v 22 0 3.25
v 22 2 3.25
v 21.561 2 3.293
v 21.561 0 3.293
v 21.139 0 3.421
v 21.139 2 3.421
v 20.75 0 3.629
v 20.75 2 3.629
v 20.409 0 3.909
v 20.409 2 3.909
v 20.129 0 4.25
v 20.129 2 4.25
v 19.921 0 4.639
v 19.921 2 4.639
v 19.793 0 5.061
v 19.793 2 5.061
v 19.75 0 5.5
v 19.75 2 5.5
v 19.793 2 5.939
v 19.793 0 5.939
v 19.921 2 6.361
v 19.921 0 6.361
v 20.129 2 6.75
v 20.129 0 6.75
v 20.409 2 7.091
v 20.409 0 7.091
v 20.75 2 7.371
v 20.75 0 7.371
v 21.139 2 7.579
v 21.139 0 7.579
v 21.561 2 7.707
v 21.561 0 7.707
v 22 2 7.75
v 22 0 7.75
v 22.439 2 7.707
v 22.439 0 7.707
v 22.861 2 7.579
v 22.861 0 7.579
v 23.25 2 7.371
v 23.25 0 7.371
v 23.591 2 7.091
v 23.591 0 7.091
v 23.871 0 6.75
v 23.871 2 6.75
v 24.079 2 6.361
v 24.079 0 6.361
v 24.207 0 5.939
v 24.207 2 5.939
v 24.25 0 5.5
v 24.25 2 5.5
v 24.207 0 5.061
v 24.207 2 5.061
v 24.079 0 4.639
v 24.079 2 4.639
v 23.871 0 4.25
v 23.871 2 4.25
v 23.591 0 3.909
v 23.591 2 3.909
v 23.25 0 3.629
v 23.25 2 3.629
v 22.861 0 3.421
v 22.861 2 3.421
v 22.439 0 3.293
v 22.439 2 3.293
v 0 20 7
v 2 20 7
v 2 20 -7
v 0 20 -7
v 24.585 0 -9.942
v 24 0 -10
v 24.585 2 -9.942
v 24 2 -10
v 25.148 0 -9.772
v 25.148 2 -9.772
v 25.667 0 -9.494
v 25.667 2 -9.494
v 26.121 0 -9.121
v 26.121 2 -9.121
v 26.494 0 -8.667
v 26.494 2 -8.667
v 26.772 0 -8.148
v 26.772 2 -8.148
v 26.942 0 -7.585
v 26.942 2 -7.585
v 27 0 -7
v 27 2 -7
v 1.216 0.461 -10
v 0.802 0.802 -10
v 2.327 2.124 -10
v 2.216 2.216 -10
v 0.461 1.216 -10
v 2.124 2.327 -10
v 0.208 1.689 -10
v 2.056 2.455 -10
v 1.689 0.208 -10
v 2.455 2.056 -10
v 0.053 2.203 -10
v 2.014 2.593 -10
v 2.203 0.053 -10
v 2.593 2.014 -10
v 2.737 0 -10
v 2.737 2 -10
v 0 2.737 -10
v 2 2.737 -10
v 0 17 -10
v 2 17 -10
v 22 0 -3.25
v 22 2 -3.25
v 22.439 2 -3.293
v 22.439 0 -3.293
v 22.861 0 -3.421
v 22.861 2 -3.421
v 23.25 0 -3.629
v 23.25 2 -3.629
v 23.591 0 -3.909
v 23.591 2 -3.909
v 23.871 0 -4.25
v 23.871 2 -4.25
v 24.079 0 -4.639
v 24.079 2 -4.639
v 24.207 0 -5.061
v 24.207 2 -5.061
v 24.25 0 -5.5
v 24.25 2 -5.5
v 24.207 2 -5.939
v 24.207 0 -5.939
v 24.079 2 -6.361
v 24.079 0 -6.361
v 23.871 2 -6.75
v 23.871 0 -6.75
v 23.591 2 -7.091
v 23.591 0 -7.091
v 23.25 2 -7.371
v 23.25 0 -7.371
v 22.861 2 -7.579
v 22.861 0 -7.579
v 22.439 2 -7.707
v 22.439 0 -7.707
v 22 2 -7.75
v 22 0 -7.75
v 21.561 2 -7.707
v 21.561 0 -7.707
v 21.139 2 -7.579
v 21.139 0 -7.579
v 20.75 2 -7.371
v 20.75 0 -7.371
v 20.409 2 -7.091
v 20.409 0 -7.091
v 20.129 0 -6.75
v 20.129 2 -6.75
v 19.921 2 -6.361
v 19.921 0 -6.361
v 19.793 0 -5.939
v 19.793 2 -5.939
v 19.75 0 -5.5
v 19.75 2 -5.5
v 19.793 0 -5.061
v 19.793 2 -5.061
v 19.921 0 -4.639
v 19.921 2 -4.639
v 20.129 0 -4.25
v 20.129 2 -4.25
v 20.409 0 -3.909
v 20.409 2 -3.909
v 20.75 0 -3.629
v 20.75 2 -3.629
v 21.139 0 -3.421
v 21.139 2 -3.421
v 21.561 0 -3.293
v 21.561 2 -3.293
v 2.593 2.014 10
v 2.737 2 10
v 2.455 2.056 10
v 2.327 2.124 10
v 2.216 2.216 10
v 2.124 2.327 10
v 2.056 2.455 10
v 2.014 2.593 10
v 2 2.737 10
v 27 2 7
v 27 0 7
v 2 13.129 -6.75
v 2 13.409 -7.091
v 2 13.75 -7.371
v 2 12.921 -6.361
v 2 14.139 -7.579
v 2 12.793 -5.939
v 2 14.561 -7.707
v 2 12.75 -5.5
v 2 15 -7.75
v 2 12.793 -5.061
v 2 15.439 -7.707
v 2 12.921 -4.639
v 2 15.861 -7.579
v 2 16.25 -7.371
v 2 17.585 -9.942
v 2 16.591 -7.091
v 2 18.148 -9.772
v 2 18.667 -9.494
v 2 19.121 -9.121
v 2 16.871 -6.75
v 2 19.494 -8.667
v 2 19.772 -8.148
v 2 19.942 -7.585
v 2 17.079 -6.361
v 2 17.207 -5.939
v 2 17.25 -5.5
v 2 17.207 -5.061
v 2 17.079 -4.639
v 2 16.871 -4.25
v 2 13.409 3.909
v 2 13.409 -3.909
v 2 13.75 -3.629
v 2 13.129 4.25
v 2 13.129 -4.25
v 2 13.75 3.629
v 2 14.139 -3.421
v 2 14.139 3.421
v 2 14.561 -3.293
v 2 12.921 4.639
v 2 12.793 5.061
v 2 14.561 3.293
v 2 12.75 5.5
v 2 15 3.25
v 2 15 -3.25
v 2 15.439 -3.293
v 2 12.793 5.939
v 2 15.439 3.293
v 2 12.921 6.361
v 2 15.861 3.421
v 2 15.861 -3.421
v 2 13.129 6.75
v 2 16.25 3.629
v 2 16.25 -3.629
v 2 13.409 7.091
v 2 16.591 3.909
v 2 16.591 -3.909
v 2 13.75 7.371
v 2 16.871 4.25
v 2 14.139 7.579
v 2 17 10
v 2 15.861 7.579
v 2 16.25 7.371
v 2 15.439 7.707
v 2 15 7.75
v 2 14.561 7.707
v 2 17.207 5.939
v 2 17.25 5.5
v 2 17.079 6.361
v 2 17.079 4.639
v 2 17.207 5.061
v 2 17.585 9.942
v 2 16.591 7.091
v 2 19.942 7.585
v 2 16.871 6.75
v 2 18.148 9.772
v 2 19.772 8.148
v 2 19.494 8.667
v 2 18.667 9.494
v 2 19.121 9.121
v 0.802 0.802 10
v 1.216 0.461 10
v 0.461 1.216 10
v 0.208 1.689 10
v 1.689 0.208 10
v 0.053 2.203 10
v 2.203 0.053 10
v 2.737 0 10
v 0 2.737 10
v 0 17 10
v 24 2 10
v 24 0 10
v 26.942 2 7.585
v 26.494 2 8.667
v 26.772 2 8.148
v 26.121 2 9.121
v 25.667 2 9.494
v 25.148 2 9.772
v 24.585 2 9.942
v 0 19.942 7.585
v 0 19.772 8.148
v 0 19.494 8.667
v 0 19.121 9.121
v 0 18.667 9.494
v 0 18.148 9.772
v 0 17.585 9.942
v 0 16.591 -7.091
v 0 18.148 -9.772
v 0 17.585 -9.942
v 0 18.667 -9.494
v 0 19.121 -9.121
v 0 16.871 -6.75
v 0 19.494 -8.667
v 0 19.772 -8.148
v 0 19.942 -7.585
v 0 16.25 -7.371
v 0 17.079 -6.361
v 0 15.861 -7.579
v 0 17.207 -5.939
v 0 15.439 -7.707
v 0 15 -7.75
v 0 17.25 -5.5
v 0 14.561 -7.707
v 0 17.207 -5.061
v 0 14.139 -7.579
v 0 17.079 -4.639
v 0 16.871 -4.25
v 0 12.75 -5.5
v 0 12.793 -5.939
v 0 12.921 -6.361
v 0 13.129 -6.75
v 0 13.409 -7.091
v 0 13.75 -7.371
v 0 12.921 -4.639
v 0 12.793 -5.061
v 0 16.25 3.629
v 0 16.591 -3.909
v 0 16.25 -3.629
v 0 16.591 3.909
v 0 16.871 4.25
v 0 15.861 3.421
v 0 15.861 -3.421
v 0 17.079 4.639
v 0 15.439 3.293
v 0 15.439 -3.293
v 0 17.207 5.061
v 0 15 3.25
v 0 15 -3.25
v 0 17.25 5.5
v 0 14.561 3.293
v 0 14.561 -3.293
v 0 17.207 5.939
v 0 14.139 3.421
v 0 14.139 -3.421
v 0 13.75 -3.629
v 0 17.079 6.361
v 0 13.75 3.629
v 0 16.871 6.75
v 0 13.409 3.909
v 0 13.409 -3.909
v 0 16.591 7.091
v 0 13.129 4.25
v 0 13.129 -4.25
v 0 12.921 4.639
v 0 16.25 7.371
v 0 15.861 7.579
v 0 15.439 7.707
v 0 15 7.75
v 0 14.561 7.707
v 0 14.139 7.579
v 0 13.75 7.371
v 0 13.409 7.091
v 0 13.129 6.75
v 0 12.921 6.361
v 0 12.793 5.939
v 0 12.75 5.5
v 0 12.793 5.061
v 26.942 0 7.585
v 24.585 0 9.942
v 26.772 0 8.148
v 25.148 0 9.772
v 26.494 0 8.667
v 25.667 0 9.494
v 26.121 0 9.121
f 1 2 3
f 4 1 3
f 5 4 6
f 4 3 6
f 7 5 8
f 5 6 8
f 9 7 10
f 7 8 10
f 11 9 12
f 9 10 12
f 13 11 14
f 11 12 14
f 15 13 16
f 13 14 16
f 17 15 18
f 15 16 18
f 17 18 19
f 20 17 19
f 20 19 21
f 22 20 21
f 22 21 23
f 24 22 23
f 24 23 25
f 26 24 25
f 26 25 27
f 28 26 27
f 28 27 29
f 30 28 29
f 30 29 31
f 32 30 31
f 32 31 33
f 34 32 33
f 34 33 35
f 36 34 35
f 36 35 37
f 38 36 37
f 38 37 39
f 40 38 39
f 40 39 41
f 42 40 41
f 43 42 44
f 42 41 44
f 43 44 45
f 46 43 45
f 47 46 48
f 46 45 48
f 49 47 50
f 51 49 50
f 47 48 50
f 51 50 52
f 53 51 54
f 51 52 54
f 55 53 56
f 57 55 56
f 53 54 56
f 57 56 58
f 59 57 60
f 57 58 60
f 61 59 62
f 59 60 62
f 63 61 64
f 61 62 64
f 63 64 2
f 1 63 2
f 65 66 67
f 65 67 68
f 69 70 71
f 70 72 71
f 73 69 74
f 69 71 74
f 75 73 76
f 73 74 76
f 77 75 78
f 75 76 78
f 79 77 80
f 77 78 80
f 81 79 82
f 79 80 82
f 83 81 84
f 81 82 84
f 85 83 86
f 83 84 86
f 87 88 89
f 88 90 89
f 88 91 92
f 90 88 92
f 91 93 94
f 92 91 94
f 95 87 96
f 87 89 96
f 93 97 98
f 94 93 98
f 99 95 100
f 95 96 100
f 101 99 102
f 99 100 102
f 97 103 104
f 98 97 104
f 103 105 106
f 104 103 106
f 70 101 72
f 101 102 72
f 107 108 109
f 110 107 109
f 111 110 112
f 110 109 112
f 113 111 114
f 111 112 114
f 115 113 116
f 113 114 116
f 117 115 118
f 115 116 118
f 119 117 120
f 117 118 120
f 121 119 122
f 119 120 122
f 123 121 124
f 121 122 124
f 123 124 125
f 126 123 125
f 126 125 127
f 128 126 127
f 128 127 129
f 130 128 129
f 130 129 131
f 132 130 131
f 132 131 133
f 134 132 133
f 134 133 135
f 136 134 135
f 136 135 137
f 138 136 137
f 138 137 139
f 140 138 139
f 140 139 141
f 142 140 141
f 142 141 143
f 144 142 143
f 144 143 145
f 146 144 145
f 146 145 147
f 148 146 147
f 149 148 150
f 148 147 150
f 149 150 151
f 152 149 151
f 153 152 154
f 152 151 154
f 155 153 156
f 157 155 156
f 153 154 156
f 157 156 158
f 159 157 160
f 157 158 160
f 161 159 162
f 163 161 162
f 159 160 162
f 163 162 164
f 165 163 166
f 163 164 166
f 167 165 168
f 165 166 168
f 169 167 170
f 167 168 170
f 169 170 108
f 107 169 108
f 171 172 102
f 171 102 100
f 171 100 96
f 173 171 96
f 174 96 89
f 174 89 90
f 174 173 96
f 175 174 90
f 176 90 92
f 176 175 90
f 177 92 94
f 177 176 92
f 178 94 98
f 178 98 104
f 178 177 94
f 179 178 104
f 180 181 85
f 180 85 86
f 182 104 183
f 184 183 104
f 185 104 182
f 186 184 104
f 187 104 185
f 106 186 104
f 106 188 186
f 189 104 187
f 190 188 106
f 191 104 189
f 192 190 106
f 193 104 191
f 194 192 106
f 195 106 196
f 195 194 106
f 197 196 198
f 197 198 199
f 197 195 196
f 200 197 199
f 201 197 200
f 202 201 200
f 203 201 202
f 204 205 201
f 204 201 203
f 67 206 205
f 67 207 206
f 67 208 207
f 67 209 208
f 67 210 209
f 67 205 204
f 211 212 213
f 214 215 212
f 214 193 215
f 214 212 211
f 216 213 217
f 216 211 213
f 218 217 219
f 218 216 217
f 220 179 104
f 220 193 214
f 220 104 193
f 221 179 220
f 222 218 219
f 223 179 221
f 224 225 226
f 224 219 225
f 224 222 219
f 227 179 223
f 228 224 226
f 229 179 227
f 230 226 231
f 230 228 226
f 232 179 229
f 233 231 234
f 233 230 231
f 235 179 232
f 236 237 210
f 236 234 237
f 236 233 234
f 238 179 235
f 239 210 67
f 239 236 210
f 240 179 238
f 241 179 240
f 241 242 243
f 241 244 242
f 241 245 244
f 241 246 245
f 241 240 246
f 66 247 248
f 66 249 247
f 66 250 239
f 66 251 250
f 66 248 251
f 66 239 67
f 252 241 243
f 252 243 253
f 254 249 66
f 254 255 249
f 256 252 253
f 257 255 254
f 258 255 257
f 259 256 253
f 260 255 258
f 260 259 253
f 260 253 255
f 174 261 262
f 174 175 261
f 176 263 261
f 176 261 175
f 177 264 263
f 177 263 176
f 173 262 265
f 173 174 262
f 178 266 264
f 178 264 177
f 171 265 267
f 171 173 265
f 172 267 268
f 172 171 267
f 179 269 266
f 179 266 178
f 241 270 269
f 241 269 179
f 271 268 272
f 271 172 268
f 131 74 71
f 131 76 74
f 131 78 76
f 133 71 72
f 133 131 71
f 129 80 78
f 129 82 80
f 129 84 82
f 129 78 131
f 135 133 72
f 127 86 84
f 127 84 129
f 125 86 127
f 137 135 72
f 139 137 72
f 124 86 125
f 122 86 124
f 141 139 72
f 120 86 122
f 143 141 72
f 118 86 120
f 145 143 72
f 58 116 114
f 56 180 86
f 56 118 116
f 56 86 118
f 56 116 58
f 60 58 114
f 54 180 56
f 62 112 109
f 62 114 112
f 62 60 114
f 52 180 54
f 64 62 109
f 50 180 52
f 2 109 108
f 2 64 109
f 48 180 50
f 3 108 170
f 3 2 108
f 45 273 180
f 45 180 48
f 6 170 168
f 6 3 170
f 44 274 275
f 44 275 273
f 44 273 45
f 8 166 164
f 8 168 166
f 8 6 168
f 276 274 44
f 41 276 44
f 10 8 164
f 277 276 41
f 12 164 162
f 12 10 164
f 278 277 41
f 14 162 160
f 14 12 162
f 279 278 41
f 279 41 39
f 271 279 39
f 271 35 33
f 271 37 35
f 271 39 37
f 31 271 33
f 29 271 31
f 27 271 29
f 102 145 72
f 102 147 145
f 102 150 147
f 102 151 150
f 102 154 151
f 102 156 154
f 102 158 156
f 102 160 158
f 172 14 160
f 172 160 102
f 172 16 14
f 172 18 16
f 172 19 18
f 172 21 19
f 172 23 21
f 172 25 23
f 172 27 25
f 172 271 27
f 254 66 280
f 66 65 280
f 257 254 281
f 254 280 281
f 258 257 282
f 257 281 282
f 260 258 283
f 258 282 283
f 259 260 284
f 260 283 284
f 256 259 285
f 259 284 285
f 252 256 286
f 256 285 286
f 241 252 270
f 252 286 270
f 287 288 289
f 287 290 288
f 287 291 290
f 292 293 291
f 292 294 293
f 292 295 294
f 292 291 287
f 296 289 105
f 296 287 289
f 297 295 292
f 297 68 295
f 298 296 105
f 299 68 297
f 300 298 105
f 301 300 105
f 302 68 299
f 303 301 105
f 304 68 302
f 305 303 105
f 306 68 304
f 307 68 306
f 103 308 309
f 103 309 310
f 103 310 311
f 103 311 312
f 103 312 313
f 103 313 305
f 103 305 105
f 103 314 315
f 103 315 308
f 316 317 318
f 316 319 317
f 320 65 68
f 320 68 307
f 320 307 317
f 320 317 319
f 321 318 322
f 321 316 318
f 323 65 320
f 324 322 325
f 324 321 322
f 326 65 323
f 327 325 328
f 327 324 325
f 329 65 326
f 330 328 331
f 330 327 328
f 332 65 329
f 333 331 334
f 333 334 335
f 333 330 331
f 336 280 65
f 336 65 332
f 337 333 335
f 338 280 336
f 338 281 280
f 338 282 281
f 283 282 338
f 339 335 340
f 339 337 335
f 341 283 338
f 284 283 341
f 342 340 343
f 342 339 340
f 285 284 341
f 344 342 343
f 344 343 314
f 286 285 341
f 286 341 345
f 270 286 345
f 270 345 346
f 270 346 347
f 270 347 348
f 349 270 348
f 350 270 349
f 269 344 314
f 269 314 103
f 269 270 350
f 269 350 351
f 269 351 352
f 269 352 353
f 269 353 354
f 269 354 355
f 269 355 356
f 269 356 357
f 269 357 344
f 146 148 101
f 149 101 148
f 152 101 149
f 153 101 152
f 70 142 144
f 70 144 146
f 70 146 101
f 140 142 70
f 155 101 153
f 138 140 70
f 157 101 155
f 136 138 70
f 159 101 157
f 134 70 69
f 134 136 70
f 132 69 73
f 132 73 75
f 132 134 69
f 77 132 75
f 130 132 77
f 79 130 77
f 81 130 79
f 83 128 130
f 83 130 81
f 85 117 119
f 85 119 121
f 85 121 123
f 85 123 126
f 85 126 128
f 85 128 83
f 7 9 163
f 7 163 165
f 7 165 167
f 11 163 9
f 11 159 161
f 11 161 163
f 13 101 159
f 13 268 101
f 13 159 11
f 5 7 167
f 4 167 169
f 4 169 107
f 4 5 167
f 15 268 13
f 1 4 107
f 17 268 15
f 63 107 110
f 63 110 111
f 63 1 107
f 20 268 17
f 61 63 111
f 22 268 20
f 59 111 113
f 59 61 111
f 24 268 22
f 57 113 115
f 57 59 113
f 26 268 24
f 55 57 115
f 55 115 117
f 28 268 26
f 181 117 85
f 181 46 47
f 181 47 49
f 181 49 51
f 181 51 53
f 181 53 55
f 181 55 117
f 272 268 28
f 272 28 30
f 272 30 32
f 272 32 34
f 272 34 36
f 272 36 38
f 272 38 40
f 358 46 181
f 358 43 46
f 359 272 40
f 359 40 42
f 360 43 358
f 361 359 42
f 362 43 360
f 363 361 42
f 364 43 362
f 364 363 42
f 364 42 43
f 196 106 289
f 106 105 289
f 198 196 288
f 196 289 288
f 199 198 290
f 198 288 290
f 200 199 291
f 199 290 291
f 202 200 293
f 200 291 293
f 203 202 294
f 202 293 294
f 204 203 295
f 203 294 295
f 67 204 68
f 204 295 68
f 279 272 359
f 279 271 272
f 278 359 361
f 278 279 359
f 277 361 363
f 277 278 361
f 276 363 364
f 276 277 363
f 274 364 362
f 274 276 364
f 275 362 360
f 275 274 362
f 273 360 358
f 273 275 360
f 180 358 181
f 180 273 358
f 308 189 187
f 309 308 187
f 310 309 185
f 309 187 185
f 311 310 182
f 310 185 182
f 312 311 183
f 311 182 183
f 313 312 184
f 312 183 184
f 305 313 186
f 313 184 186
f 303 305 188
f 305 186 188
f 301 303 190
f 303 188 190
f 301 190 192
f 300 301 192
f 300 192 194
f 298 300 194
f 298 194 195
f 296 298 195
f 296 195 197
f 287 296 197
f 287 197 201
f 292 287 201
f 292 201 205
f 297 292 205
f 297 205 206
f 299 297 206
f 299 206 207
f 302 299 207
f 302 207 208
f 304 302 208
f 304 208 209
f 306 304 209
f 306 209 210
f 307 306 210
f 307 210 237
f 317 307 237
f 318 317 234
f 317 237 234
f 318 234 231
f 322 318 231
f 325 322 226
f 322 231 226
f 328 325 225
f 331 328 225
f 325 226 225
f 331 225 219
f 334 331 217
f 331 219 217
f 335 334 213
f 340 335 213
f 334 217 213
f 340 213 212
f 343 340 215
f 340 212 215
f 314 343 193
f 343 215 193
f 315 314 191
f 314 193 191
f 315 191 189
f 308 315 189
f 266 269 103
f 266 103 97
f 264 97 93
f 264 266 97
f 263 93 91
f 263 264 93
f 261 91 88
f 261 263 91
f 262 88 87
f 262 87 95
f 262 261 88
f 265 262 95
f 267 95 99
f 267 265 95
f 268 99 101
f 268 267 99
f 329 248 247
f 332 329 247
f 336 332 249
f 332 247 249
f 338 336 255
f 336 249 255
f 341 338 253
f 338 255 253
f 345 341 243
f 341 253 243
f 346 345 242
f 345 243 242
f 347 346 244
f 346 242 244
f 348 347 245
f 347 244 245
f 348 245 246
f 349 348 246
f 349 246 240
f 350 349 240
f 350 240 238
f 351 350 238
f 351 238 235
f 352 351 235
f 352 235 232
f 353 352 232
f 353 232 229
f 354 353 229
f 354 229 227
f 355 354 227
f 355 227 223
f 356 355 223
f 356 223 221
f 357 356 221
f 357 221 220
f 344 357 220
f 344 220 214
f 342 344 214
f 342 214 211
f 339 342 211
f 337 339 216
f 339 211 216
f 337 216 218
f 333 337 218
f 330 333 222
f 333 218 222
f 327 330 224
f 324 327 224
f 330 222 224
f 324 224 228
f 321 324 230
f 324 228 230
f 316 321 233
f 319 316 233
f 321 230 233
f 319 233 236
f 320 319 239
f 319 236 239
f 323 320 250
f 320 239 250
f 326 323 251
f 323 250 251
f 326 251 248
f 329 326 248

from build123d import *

# Parameters (mm, degrees)
SM_BASE_FLANGE_1_DEPTH = 10
SKETCH_3_R             = 2.25
CUT_EXTRUDE_1_DEPTH    = 34.541019662
SKETCH_4_R             = 2.25
CUT_EXTRUDE_2_DEPTH    = 34.955853693
FILLET_1_R             = 3


# Sheet-metal steps are written as plain solids
with BuildPart() as part:
    # Sketch 1 → 基体-法兰1 (new, symmetric)
    with BuildSketch(Plane.XY):
        with BuildLine():
            Line((0, 20), (0, 2.7366))
            ThreePointArc((0, 2.7366), (0.801531583, 0.801531583), (2.7366, 0))
            Line((2.7366, 0), (27, 0))
            Line((27, 0), (27, 2))
            Line((27, 2), (2.7366, 2))
            ThreePointArc((2.7366, 2), (2.215745145, 2.215745145), (2, 2.7366))
            Line((2, 2.7366), (2, 20))
            Line((2, 20), (0, 20))
        make_face()
    extrude(amount=SM_BASE_FLANGE_1_DEPTH, both=True)

    # 草图3 → 切除-拉伸1 (cut, through all)
    with BuildSketch(Plane(origin=(2, 0, 0), x_dir=(0, 0, -1), z_dir=(1, 0, 0))):
        with Locations(Location((-5.5, 15, 0), (0, 0, 90))):
            Circle(SKETCH_3_R)
        with Locations(Location((5.5, 15, 0), (0, 0, 270))):
            Circle(SKETCH_3_R)
    extrude(amount=-CUT_EXTRUDE_1_DEPTH, mode=Mode.SUBTRACT)

    # 草图4 → 切除-拉伸2 (cut, through all)
    with BuildSketch(Plane(origin=(0, 2, 0), x_dir=(1, 0, 0), z_dir=(0, 1, 0))):
        with Locations(Location((22, 5.5, 0), (0, 0, 270))):
            Circle(SKETCH_4_R)
        with Locations(Location((22, -5.5, 0), (0, 0, 90))):
            Circle(SKETCH_4_R)
    extrude(amount=-CUT_EXTRUDE_2_DEPTH, mode=Mode.SUBTRACT)

    # 圆角1
    fillet_1_edges = [part.edges().sort_by_distance(p)[0] for p in [
        (1, 20, 10),
        (27, 1, 10),
        (1, 20, -10),
        (27, 1, -10),
    ]]
    fillet(fillet_1_edges, radius=FILLET_1_R)


solid = part.part
